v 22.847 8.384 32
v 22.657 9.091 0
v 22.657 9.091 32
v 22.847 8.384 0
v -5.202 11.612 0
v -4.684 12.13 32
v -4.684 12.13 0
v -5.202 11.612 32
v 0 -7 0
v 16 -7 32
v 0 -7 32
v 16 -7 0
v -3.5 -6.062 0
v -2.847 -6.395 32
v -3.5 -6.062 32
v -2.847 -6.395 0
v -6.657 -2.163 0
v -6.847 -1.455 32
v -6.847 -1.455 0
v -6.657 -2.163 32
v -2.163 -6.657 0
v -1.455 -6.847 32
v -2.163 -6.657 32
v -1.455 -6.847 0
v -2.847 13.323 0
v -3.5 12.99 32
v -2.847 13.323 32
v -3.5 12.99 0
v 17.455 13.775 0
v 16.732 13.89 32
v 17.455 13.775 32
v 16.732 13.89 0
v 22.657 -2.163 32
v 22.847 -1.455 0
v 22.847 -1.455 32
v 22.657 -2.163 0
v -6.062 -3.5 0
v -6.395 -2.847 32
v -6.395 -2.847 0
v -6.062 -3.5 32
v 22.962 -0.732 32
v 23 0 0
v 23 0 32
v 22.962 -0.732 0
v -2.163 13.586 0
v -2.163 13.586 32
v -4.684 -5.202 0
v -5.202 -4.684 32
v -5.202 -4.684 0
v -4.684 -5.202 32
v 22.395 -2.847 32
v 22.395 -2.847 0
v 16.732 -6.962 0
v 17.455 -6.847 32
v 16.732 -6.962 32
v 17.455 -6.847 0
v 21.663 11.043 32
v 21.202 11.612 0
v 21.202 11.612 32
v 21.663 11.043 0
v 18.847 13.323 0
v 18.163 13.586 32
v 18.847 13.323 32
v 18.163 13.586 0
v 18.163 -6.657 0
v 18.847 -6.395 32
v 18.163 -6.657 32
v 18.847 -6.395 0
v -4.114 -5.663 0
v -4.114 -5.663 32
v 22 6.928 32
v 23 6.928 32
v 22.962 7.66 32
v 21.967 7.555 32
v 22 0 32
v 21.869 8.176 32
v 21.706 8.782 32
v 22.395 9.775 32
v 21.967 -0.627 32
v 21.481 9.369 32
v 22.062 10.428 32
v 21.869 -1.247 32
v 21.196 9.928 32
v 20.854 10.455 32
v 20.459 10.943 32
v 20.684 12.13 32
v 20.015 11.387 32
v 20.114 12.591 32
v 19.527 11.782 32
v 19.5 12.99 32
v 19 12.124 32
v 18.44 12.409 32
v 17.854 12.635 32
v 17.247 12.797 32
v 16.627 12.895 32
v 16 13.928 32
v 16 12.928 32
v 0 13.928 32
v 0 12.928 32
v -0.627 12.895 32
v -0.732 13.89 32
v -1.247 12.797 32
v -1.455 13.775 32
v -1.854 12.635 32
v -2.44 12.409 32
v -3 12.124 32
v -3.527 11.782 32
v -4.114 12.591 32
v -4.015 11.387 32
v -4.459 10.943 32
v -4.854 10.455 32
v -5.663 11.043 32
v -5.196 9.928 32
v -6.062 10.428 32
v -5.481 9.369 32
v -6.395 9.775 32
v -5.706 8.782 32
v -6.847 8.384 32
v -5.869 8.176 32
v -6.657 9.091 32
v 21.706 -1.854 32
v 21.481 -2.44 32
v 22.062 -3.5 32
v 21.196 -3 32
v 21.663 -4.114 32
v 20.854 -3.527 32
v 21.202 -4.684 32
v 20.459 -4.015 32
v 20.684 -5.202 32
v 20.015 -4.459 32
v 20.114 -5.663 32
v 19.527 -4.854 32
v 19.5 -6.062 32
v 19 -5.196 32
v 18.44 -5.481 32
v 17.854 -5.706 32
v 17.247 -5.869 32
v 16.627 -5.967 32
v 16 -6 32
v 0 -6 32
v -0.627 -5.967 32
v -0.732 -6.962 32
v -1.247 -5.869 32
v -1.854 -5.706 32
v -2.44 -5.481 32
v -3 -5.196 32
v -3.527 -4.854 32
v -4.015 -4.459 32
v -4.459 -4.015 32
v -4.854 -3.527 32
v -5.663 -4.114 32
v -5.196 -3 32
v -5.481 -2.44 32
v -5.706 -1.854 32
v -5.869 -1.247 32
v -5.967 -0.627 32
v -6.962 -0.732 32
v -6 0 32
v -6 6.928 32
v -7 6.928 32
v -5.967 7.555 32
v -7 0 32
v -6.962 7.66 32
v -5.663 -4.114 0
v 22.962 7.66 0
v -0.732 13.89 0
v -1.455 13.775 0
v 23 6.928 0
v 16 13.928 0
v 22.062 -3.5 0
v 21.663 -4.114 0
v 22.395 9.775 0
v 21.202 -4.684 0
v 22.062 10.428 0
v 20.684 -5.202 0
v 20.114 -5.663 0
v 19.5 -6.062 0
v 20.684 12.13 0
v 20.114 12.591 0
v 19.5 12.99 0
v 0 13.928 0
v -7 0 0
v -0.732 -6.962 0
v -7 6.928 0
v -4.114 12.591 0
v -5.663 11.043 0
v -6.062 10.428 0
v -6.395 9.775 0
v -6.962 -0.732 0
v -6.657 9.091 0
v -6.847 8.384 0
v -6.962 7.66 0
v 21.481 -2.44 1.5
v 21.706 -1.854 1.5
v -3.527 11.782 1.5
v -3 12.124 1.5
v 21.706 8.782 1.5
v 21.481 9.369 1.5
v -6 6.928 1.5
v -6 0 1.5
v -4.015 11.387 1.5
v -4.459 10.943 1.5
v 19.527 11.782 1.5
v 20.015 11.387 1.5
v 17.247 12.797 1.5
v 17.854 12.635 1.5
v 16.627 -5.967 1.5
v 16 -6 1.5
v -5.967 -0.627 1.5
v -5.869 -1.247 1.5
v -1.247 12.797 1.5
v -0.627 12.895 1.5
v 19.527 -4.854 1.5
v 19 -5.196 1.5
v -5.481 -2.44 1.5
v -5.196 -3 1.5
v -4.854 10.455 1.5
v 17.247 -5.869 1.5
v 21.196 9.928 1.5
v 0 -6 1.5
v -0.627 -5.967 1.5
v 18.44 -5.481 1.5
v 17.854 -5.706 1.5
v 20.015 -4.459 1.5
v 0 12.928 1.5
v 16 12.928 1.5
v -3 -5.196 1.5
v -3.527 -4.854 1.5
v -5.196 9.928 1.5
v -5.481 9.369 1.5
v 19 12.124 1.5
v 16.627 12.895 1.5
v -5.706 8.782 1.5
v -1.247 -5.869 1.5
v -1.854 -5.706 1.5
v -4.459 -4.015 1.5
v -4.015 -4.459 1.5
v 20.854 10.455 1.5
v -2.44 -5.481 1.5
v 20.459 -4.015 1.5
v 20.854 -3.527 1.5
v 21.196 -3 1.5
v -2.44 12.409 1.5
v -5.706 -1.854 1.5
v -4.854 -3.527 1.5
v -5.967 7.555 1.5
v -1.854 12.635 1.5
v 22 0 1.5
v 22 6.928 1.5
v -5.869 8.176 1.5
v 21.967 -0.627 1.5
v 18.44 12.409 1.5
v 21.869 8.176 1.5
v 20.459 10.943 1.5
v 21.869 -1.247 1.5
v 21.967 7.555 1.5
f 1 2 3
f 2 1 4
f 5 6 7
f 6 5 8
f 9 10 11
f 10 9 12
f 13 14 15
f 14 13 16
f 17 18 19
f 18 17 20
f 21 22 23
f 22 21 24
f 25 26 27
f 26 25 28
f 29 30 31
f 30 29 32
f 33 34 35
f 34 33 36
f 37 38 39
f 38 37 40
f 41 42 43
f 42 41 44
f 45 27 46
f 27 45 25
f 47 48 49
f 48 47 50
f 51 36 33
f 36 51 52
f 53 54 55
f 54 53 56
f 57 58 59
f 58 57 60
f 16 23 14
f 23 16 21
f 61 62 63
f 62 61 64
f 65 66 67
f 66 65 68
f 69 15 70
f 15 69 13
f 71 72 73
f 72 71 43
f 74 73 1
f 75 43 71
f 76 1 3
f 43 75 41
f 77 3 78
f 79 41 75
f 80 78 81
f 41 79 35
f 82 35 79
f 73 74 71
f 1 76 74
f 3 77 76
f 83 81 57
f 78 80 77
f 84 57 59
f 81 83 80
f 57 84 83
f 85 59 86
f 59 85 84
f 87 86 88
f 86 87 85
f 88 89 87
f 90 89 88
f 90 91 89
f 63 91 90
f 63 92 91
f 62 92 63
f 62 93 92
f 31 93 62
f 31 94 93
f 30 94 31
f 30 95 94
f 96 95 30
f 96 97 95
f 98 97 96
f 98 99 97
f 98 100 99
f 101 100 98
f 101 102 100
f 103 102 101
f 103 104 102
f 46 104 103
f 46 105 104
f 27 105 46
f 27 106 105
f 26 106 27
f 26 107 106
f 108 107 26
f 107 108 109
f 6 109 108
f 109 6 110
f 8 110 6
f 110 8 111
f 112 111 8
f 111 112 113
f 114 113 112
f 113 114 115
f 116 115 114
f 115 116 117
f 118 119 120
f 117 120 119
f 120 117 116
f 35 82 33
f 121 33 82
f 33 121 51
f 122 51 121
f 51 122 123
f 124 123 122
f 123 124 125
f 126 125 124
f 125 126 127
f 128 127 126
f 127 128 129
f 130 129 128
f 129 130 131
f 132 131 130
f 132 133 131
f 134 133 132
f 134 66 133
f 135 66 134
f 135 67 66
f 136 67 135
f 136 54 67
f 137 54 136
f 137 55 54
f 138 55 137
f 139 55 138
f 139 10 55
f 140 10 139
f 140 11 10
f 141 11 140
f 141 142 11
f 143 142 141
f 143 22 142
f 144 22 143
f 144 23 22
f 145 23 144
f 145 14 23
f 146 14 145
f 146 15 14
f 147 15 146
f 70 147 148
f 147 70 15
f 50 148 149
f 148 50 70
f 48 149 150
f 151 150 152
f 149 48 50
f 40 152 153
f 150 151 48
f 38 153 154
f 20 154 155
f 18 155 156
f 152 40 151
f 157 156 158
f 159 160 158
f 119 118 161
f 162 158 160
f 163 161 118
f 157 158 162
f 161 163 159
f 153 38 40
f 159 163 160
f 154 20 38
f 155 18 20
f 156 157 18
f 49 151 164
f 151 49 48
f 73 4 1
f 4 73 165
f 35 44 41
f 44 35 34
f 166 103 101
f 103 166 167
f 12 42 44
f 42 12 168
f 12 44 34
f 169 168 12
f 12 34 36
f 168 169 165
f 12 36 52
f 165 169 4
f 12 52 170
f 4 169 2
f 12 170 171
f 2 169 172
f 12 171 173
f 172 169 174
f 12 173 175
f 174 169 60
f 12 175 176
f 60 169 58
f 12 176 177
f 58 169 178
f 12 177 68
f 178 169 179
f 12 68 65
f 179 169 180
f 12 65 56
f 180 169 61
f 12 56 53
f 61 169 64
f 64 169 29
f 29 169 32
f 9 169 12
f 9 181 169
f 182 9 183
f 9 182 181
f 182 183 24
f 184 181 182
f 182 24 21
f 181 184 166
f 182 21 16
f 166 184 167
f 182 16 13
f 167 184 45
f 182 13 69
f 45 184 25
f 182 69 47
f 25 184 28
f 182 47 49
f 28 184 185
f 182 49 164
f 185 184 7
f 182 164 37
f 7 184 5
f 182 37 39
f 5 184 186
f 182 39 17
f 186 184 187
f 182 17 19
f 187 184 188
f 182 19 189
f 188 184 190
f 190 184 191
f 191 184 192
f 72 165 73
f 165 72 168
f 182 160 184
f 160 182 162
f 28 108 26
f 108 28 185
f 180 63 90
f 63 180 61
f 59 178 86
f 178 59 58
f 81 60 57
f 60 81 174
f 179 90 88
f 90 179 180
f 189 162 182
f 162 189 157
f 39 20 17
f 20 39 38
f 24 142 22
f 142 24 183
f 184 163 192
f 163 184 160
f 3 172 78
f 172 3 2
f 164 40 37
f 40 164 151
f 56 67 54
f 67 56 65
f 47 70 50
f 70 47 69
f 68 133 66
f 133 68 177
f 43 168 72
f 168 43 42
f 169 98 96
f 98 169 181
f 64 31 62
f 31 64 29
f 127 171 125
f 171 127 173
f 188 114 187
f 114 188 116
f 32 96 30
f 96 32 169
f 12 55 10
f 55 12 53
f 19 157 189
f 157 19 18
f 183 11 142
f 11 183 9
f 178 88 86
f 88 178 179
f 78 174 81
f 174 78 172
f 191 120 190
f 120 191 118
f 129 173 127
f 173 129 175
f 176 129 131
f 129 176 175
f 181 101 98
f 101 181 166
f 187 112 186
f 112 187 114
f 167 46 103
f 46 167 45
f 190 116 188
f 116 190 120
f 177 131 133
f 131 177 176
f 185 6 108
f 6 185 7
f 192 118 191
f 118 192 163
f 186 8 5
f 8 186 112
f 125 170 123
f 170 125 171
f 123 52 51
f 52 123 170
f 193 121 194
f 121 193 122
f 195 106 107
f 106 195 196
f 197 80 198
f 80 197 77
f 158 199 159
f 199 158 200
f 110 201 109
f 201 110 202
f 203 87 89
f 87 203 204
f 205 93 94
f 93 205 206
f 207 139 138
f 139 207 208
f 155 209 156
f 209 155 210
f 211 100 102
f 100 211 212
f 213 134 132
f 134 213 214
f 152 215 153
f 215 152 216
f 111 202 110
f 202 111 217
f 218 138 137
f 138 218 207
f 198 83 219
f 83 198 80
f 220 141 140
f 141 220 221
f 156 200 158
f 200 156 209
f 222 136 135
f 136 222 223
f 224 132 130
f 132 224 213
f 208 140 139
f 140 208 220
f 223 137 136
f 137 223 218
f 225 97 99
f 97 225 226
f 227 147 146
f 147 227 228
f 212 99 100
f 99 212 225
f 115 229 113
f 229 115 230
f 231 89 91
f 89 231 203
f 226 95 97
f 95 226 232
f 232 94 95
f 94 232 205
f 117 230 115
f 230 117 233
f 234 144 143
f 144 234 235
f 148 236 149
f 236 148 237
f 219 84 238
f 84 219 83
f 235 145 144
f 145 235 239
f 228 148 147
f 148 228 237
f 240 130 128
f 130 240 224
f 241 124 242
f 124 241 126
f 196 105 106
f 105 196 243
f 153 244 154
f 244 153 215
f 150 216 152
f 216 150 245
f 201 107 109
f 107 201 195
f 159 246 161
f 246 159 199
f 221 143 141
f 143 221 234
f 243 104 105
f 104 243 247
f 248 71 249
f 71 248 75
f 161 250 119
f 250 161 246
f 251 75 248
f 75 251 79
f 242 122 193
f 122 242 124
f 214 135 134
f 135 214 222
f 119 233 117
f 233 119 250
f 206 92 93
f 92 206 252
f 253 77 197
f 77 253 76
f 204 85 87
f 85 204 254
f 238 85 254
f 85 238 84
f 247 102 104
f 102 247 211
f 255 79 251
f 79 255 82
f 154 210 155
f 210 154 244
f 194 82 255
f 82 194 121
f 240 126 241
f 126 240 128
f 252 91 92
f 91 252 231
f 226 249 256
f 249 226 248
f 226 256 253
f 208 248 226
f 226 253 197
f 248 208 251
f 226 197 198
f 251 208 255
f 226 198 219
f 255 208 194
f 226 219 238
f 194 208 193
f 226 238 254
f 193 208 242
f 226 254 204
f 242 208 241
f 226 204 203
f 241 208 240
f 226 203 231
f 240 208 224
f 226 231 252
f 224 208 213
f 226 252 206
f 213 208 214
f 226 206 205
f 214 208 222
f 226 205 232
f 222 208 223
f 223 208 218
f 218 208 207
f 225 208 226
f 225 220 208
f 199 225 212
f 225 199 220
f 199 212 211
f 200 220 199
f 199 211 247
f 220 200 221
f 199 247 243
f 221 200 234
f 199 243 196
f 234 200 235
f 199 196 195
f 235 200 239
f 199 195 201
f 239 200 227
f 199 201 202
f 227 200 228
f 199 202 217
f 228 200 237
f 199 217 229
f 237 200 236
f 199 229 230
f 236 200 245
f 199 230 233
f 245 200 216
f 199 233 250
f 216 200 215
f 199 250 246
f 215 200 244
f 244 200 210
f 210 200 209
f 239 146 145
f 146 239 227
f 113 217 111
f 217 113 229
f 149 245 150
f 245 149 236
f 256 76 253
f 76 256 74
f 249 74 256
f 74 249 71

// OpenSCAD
$fn=60;

difference(){
minkowski(){
cylinder(d=14,h=2);
cube([16,8*sqrt(3)/2,30]);
}
translate([0,0,1.5])
minkowski(){
cylinder(d=12,h=1);
cube([16,8*sqrt(3)/2,30]);
}
}
